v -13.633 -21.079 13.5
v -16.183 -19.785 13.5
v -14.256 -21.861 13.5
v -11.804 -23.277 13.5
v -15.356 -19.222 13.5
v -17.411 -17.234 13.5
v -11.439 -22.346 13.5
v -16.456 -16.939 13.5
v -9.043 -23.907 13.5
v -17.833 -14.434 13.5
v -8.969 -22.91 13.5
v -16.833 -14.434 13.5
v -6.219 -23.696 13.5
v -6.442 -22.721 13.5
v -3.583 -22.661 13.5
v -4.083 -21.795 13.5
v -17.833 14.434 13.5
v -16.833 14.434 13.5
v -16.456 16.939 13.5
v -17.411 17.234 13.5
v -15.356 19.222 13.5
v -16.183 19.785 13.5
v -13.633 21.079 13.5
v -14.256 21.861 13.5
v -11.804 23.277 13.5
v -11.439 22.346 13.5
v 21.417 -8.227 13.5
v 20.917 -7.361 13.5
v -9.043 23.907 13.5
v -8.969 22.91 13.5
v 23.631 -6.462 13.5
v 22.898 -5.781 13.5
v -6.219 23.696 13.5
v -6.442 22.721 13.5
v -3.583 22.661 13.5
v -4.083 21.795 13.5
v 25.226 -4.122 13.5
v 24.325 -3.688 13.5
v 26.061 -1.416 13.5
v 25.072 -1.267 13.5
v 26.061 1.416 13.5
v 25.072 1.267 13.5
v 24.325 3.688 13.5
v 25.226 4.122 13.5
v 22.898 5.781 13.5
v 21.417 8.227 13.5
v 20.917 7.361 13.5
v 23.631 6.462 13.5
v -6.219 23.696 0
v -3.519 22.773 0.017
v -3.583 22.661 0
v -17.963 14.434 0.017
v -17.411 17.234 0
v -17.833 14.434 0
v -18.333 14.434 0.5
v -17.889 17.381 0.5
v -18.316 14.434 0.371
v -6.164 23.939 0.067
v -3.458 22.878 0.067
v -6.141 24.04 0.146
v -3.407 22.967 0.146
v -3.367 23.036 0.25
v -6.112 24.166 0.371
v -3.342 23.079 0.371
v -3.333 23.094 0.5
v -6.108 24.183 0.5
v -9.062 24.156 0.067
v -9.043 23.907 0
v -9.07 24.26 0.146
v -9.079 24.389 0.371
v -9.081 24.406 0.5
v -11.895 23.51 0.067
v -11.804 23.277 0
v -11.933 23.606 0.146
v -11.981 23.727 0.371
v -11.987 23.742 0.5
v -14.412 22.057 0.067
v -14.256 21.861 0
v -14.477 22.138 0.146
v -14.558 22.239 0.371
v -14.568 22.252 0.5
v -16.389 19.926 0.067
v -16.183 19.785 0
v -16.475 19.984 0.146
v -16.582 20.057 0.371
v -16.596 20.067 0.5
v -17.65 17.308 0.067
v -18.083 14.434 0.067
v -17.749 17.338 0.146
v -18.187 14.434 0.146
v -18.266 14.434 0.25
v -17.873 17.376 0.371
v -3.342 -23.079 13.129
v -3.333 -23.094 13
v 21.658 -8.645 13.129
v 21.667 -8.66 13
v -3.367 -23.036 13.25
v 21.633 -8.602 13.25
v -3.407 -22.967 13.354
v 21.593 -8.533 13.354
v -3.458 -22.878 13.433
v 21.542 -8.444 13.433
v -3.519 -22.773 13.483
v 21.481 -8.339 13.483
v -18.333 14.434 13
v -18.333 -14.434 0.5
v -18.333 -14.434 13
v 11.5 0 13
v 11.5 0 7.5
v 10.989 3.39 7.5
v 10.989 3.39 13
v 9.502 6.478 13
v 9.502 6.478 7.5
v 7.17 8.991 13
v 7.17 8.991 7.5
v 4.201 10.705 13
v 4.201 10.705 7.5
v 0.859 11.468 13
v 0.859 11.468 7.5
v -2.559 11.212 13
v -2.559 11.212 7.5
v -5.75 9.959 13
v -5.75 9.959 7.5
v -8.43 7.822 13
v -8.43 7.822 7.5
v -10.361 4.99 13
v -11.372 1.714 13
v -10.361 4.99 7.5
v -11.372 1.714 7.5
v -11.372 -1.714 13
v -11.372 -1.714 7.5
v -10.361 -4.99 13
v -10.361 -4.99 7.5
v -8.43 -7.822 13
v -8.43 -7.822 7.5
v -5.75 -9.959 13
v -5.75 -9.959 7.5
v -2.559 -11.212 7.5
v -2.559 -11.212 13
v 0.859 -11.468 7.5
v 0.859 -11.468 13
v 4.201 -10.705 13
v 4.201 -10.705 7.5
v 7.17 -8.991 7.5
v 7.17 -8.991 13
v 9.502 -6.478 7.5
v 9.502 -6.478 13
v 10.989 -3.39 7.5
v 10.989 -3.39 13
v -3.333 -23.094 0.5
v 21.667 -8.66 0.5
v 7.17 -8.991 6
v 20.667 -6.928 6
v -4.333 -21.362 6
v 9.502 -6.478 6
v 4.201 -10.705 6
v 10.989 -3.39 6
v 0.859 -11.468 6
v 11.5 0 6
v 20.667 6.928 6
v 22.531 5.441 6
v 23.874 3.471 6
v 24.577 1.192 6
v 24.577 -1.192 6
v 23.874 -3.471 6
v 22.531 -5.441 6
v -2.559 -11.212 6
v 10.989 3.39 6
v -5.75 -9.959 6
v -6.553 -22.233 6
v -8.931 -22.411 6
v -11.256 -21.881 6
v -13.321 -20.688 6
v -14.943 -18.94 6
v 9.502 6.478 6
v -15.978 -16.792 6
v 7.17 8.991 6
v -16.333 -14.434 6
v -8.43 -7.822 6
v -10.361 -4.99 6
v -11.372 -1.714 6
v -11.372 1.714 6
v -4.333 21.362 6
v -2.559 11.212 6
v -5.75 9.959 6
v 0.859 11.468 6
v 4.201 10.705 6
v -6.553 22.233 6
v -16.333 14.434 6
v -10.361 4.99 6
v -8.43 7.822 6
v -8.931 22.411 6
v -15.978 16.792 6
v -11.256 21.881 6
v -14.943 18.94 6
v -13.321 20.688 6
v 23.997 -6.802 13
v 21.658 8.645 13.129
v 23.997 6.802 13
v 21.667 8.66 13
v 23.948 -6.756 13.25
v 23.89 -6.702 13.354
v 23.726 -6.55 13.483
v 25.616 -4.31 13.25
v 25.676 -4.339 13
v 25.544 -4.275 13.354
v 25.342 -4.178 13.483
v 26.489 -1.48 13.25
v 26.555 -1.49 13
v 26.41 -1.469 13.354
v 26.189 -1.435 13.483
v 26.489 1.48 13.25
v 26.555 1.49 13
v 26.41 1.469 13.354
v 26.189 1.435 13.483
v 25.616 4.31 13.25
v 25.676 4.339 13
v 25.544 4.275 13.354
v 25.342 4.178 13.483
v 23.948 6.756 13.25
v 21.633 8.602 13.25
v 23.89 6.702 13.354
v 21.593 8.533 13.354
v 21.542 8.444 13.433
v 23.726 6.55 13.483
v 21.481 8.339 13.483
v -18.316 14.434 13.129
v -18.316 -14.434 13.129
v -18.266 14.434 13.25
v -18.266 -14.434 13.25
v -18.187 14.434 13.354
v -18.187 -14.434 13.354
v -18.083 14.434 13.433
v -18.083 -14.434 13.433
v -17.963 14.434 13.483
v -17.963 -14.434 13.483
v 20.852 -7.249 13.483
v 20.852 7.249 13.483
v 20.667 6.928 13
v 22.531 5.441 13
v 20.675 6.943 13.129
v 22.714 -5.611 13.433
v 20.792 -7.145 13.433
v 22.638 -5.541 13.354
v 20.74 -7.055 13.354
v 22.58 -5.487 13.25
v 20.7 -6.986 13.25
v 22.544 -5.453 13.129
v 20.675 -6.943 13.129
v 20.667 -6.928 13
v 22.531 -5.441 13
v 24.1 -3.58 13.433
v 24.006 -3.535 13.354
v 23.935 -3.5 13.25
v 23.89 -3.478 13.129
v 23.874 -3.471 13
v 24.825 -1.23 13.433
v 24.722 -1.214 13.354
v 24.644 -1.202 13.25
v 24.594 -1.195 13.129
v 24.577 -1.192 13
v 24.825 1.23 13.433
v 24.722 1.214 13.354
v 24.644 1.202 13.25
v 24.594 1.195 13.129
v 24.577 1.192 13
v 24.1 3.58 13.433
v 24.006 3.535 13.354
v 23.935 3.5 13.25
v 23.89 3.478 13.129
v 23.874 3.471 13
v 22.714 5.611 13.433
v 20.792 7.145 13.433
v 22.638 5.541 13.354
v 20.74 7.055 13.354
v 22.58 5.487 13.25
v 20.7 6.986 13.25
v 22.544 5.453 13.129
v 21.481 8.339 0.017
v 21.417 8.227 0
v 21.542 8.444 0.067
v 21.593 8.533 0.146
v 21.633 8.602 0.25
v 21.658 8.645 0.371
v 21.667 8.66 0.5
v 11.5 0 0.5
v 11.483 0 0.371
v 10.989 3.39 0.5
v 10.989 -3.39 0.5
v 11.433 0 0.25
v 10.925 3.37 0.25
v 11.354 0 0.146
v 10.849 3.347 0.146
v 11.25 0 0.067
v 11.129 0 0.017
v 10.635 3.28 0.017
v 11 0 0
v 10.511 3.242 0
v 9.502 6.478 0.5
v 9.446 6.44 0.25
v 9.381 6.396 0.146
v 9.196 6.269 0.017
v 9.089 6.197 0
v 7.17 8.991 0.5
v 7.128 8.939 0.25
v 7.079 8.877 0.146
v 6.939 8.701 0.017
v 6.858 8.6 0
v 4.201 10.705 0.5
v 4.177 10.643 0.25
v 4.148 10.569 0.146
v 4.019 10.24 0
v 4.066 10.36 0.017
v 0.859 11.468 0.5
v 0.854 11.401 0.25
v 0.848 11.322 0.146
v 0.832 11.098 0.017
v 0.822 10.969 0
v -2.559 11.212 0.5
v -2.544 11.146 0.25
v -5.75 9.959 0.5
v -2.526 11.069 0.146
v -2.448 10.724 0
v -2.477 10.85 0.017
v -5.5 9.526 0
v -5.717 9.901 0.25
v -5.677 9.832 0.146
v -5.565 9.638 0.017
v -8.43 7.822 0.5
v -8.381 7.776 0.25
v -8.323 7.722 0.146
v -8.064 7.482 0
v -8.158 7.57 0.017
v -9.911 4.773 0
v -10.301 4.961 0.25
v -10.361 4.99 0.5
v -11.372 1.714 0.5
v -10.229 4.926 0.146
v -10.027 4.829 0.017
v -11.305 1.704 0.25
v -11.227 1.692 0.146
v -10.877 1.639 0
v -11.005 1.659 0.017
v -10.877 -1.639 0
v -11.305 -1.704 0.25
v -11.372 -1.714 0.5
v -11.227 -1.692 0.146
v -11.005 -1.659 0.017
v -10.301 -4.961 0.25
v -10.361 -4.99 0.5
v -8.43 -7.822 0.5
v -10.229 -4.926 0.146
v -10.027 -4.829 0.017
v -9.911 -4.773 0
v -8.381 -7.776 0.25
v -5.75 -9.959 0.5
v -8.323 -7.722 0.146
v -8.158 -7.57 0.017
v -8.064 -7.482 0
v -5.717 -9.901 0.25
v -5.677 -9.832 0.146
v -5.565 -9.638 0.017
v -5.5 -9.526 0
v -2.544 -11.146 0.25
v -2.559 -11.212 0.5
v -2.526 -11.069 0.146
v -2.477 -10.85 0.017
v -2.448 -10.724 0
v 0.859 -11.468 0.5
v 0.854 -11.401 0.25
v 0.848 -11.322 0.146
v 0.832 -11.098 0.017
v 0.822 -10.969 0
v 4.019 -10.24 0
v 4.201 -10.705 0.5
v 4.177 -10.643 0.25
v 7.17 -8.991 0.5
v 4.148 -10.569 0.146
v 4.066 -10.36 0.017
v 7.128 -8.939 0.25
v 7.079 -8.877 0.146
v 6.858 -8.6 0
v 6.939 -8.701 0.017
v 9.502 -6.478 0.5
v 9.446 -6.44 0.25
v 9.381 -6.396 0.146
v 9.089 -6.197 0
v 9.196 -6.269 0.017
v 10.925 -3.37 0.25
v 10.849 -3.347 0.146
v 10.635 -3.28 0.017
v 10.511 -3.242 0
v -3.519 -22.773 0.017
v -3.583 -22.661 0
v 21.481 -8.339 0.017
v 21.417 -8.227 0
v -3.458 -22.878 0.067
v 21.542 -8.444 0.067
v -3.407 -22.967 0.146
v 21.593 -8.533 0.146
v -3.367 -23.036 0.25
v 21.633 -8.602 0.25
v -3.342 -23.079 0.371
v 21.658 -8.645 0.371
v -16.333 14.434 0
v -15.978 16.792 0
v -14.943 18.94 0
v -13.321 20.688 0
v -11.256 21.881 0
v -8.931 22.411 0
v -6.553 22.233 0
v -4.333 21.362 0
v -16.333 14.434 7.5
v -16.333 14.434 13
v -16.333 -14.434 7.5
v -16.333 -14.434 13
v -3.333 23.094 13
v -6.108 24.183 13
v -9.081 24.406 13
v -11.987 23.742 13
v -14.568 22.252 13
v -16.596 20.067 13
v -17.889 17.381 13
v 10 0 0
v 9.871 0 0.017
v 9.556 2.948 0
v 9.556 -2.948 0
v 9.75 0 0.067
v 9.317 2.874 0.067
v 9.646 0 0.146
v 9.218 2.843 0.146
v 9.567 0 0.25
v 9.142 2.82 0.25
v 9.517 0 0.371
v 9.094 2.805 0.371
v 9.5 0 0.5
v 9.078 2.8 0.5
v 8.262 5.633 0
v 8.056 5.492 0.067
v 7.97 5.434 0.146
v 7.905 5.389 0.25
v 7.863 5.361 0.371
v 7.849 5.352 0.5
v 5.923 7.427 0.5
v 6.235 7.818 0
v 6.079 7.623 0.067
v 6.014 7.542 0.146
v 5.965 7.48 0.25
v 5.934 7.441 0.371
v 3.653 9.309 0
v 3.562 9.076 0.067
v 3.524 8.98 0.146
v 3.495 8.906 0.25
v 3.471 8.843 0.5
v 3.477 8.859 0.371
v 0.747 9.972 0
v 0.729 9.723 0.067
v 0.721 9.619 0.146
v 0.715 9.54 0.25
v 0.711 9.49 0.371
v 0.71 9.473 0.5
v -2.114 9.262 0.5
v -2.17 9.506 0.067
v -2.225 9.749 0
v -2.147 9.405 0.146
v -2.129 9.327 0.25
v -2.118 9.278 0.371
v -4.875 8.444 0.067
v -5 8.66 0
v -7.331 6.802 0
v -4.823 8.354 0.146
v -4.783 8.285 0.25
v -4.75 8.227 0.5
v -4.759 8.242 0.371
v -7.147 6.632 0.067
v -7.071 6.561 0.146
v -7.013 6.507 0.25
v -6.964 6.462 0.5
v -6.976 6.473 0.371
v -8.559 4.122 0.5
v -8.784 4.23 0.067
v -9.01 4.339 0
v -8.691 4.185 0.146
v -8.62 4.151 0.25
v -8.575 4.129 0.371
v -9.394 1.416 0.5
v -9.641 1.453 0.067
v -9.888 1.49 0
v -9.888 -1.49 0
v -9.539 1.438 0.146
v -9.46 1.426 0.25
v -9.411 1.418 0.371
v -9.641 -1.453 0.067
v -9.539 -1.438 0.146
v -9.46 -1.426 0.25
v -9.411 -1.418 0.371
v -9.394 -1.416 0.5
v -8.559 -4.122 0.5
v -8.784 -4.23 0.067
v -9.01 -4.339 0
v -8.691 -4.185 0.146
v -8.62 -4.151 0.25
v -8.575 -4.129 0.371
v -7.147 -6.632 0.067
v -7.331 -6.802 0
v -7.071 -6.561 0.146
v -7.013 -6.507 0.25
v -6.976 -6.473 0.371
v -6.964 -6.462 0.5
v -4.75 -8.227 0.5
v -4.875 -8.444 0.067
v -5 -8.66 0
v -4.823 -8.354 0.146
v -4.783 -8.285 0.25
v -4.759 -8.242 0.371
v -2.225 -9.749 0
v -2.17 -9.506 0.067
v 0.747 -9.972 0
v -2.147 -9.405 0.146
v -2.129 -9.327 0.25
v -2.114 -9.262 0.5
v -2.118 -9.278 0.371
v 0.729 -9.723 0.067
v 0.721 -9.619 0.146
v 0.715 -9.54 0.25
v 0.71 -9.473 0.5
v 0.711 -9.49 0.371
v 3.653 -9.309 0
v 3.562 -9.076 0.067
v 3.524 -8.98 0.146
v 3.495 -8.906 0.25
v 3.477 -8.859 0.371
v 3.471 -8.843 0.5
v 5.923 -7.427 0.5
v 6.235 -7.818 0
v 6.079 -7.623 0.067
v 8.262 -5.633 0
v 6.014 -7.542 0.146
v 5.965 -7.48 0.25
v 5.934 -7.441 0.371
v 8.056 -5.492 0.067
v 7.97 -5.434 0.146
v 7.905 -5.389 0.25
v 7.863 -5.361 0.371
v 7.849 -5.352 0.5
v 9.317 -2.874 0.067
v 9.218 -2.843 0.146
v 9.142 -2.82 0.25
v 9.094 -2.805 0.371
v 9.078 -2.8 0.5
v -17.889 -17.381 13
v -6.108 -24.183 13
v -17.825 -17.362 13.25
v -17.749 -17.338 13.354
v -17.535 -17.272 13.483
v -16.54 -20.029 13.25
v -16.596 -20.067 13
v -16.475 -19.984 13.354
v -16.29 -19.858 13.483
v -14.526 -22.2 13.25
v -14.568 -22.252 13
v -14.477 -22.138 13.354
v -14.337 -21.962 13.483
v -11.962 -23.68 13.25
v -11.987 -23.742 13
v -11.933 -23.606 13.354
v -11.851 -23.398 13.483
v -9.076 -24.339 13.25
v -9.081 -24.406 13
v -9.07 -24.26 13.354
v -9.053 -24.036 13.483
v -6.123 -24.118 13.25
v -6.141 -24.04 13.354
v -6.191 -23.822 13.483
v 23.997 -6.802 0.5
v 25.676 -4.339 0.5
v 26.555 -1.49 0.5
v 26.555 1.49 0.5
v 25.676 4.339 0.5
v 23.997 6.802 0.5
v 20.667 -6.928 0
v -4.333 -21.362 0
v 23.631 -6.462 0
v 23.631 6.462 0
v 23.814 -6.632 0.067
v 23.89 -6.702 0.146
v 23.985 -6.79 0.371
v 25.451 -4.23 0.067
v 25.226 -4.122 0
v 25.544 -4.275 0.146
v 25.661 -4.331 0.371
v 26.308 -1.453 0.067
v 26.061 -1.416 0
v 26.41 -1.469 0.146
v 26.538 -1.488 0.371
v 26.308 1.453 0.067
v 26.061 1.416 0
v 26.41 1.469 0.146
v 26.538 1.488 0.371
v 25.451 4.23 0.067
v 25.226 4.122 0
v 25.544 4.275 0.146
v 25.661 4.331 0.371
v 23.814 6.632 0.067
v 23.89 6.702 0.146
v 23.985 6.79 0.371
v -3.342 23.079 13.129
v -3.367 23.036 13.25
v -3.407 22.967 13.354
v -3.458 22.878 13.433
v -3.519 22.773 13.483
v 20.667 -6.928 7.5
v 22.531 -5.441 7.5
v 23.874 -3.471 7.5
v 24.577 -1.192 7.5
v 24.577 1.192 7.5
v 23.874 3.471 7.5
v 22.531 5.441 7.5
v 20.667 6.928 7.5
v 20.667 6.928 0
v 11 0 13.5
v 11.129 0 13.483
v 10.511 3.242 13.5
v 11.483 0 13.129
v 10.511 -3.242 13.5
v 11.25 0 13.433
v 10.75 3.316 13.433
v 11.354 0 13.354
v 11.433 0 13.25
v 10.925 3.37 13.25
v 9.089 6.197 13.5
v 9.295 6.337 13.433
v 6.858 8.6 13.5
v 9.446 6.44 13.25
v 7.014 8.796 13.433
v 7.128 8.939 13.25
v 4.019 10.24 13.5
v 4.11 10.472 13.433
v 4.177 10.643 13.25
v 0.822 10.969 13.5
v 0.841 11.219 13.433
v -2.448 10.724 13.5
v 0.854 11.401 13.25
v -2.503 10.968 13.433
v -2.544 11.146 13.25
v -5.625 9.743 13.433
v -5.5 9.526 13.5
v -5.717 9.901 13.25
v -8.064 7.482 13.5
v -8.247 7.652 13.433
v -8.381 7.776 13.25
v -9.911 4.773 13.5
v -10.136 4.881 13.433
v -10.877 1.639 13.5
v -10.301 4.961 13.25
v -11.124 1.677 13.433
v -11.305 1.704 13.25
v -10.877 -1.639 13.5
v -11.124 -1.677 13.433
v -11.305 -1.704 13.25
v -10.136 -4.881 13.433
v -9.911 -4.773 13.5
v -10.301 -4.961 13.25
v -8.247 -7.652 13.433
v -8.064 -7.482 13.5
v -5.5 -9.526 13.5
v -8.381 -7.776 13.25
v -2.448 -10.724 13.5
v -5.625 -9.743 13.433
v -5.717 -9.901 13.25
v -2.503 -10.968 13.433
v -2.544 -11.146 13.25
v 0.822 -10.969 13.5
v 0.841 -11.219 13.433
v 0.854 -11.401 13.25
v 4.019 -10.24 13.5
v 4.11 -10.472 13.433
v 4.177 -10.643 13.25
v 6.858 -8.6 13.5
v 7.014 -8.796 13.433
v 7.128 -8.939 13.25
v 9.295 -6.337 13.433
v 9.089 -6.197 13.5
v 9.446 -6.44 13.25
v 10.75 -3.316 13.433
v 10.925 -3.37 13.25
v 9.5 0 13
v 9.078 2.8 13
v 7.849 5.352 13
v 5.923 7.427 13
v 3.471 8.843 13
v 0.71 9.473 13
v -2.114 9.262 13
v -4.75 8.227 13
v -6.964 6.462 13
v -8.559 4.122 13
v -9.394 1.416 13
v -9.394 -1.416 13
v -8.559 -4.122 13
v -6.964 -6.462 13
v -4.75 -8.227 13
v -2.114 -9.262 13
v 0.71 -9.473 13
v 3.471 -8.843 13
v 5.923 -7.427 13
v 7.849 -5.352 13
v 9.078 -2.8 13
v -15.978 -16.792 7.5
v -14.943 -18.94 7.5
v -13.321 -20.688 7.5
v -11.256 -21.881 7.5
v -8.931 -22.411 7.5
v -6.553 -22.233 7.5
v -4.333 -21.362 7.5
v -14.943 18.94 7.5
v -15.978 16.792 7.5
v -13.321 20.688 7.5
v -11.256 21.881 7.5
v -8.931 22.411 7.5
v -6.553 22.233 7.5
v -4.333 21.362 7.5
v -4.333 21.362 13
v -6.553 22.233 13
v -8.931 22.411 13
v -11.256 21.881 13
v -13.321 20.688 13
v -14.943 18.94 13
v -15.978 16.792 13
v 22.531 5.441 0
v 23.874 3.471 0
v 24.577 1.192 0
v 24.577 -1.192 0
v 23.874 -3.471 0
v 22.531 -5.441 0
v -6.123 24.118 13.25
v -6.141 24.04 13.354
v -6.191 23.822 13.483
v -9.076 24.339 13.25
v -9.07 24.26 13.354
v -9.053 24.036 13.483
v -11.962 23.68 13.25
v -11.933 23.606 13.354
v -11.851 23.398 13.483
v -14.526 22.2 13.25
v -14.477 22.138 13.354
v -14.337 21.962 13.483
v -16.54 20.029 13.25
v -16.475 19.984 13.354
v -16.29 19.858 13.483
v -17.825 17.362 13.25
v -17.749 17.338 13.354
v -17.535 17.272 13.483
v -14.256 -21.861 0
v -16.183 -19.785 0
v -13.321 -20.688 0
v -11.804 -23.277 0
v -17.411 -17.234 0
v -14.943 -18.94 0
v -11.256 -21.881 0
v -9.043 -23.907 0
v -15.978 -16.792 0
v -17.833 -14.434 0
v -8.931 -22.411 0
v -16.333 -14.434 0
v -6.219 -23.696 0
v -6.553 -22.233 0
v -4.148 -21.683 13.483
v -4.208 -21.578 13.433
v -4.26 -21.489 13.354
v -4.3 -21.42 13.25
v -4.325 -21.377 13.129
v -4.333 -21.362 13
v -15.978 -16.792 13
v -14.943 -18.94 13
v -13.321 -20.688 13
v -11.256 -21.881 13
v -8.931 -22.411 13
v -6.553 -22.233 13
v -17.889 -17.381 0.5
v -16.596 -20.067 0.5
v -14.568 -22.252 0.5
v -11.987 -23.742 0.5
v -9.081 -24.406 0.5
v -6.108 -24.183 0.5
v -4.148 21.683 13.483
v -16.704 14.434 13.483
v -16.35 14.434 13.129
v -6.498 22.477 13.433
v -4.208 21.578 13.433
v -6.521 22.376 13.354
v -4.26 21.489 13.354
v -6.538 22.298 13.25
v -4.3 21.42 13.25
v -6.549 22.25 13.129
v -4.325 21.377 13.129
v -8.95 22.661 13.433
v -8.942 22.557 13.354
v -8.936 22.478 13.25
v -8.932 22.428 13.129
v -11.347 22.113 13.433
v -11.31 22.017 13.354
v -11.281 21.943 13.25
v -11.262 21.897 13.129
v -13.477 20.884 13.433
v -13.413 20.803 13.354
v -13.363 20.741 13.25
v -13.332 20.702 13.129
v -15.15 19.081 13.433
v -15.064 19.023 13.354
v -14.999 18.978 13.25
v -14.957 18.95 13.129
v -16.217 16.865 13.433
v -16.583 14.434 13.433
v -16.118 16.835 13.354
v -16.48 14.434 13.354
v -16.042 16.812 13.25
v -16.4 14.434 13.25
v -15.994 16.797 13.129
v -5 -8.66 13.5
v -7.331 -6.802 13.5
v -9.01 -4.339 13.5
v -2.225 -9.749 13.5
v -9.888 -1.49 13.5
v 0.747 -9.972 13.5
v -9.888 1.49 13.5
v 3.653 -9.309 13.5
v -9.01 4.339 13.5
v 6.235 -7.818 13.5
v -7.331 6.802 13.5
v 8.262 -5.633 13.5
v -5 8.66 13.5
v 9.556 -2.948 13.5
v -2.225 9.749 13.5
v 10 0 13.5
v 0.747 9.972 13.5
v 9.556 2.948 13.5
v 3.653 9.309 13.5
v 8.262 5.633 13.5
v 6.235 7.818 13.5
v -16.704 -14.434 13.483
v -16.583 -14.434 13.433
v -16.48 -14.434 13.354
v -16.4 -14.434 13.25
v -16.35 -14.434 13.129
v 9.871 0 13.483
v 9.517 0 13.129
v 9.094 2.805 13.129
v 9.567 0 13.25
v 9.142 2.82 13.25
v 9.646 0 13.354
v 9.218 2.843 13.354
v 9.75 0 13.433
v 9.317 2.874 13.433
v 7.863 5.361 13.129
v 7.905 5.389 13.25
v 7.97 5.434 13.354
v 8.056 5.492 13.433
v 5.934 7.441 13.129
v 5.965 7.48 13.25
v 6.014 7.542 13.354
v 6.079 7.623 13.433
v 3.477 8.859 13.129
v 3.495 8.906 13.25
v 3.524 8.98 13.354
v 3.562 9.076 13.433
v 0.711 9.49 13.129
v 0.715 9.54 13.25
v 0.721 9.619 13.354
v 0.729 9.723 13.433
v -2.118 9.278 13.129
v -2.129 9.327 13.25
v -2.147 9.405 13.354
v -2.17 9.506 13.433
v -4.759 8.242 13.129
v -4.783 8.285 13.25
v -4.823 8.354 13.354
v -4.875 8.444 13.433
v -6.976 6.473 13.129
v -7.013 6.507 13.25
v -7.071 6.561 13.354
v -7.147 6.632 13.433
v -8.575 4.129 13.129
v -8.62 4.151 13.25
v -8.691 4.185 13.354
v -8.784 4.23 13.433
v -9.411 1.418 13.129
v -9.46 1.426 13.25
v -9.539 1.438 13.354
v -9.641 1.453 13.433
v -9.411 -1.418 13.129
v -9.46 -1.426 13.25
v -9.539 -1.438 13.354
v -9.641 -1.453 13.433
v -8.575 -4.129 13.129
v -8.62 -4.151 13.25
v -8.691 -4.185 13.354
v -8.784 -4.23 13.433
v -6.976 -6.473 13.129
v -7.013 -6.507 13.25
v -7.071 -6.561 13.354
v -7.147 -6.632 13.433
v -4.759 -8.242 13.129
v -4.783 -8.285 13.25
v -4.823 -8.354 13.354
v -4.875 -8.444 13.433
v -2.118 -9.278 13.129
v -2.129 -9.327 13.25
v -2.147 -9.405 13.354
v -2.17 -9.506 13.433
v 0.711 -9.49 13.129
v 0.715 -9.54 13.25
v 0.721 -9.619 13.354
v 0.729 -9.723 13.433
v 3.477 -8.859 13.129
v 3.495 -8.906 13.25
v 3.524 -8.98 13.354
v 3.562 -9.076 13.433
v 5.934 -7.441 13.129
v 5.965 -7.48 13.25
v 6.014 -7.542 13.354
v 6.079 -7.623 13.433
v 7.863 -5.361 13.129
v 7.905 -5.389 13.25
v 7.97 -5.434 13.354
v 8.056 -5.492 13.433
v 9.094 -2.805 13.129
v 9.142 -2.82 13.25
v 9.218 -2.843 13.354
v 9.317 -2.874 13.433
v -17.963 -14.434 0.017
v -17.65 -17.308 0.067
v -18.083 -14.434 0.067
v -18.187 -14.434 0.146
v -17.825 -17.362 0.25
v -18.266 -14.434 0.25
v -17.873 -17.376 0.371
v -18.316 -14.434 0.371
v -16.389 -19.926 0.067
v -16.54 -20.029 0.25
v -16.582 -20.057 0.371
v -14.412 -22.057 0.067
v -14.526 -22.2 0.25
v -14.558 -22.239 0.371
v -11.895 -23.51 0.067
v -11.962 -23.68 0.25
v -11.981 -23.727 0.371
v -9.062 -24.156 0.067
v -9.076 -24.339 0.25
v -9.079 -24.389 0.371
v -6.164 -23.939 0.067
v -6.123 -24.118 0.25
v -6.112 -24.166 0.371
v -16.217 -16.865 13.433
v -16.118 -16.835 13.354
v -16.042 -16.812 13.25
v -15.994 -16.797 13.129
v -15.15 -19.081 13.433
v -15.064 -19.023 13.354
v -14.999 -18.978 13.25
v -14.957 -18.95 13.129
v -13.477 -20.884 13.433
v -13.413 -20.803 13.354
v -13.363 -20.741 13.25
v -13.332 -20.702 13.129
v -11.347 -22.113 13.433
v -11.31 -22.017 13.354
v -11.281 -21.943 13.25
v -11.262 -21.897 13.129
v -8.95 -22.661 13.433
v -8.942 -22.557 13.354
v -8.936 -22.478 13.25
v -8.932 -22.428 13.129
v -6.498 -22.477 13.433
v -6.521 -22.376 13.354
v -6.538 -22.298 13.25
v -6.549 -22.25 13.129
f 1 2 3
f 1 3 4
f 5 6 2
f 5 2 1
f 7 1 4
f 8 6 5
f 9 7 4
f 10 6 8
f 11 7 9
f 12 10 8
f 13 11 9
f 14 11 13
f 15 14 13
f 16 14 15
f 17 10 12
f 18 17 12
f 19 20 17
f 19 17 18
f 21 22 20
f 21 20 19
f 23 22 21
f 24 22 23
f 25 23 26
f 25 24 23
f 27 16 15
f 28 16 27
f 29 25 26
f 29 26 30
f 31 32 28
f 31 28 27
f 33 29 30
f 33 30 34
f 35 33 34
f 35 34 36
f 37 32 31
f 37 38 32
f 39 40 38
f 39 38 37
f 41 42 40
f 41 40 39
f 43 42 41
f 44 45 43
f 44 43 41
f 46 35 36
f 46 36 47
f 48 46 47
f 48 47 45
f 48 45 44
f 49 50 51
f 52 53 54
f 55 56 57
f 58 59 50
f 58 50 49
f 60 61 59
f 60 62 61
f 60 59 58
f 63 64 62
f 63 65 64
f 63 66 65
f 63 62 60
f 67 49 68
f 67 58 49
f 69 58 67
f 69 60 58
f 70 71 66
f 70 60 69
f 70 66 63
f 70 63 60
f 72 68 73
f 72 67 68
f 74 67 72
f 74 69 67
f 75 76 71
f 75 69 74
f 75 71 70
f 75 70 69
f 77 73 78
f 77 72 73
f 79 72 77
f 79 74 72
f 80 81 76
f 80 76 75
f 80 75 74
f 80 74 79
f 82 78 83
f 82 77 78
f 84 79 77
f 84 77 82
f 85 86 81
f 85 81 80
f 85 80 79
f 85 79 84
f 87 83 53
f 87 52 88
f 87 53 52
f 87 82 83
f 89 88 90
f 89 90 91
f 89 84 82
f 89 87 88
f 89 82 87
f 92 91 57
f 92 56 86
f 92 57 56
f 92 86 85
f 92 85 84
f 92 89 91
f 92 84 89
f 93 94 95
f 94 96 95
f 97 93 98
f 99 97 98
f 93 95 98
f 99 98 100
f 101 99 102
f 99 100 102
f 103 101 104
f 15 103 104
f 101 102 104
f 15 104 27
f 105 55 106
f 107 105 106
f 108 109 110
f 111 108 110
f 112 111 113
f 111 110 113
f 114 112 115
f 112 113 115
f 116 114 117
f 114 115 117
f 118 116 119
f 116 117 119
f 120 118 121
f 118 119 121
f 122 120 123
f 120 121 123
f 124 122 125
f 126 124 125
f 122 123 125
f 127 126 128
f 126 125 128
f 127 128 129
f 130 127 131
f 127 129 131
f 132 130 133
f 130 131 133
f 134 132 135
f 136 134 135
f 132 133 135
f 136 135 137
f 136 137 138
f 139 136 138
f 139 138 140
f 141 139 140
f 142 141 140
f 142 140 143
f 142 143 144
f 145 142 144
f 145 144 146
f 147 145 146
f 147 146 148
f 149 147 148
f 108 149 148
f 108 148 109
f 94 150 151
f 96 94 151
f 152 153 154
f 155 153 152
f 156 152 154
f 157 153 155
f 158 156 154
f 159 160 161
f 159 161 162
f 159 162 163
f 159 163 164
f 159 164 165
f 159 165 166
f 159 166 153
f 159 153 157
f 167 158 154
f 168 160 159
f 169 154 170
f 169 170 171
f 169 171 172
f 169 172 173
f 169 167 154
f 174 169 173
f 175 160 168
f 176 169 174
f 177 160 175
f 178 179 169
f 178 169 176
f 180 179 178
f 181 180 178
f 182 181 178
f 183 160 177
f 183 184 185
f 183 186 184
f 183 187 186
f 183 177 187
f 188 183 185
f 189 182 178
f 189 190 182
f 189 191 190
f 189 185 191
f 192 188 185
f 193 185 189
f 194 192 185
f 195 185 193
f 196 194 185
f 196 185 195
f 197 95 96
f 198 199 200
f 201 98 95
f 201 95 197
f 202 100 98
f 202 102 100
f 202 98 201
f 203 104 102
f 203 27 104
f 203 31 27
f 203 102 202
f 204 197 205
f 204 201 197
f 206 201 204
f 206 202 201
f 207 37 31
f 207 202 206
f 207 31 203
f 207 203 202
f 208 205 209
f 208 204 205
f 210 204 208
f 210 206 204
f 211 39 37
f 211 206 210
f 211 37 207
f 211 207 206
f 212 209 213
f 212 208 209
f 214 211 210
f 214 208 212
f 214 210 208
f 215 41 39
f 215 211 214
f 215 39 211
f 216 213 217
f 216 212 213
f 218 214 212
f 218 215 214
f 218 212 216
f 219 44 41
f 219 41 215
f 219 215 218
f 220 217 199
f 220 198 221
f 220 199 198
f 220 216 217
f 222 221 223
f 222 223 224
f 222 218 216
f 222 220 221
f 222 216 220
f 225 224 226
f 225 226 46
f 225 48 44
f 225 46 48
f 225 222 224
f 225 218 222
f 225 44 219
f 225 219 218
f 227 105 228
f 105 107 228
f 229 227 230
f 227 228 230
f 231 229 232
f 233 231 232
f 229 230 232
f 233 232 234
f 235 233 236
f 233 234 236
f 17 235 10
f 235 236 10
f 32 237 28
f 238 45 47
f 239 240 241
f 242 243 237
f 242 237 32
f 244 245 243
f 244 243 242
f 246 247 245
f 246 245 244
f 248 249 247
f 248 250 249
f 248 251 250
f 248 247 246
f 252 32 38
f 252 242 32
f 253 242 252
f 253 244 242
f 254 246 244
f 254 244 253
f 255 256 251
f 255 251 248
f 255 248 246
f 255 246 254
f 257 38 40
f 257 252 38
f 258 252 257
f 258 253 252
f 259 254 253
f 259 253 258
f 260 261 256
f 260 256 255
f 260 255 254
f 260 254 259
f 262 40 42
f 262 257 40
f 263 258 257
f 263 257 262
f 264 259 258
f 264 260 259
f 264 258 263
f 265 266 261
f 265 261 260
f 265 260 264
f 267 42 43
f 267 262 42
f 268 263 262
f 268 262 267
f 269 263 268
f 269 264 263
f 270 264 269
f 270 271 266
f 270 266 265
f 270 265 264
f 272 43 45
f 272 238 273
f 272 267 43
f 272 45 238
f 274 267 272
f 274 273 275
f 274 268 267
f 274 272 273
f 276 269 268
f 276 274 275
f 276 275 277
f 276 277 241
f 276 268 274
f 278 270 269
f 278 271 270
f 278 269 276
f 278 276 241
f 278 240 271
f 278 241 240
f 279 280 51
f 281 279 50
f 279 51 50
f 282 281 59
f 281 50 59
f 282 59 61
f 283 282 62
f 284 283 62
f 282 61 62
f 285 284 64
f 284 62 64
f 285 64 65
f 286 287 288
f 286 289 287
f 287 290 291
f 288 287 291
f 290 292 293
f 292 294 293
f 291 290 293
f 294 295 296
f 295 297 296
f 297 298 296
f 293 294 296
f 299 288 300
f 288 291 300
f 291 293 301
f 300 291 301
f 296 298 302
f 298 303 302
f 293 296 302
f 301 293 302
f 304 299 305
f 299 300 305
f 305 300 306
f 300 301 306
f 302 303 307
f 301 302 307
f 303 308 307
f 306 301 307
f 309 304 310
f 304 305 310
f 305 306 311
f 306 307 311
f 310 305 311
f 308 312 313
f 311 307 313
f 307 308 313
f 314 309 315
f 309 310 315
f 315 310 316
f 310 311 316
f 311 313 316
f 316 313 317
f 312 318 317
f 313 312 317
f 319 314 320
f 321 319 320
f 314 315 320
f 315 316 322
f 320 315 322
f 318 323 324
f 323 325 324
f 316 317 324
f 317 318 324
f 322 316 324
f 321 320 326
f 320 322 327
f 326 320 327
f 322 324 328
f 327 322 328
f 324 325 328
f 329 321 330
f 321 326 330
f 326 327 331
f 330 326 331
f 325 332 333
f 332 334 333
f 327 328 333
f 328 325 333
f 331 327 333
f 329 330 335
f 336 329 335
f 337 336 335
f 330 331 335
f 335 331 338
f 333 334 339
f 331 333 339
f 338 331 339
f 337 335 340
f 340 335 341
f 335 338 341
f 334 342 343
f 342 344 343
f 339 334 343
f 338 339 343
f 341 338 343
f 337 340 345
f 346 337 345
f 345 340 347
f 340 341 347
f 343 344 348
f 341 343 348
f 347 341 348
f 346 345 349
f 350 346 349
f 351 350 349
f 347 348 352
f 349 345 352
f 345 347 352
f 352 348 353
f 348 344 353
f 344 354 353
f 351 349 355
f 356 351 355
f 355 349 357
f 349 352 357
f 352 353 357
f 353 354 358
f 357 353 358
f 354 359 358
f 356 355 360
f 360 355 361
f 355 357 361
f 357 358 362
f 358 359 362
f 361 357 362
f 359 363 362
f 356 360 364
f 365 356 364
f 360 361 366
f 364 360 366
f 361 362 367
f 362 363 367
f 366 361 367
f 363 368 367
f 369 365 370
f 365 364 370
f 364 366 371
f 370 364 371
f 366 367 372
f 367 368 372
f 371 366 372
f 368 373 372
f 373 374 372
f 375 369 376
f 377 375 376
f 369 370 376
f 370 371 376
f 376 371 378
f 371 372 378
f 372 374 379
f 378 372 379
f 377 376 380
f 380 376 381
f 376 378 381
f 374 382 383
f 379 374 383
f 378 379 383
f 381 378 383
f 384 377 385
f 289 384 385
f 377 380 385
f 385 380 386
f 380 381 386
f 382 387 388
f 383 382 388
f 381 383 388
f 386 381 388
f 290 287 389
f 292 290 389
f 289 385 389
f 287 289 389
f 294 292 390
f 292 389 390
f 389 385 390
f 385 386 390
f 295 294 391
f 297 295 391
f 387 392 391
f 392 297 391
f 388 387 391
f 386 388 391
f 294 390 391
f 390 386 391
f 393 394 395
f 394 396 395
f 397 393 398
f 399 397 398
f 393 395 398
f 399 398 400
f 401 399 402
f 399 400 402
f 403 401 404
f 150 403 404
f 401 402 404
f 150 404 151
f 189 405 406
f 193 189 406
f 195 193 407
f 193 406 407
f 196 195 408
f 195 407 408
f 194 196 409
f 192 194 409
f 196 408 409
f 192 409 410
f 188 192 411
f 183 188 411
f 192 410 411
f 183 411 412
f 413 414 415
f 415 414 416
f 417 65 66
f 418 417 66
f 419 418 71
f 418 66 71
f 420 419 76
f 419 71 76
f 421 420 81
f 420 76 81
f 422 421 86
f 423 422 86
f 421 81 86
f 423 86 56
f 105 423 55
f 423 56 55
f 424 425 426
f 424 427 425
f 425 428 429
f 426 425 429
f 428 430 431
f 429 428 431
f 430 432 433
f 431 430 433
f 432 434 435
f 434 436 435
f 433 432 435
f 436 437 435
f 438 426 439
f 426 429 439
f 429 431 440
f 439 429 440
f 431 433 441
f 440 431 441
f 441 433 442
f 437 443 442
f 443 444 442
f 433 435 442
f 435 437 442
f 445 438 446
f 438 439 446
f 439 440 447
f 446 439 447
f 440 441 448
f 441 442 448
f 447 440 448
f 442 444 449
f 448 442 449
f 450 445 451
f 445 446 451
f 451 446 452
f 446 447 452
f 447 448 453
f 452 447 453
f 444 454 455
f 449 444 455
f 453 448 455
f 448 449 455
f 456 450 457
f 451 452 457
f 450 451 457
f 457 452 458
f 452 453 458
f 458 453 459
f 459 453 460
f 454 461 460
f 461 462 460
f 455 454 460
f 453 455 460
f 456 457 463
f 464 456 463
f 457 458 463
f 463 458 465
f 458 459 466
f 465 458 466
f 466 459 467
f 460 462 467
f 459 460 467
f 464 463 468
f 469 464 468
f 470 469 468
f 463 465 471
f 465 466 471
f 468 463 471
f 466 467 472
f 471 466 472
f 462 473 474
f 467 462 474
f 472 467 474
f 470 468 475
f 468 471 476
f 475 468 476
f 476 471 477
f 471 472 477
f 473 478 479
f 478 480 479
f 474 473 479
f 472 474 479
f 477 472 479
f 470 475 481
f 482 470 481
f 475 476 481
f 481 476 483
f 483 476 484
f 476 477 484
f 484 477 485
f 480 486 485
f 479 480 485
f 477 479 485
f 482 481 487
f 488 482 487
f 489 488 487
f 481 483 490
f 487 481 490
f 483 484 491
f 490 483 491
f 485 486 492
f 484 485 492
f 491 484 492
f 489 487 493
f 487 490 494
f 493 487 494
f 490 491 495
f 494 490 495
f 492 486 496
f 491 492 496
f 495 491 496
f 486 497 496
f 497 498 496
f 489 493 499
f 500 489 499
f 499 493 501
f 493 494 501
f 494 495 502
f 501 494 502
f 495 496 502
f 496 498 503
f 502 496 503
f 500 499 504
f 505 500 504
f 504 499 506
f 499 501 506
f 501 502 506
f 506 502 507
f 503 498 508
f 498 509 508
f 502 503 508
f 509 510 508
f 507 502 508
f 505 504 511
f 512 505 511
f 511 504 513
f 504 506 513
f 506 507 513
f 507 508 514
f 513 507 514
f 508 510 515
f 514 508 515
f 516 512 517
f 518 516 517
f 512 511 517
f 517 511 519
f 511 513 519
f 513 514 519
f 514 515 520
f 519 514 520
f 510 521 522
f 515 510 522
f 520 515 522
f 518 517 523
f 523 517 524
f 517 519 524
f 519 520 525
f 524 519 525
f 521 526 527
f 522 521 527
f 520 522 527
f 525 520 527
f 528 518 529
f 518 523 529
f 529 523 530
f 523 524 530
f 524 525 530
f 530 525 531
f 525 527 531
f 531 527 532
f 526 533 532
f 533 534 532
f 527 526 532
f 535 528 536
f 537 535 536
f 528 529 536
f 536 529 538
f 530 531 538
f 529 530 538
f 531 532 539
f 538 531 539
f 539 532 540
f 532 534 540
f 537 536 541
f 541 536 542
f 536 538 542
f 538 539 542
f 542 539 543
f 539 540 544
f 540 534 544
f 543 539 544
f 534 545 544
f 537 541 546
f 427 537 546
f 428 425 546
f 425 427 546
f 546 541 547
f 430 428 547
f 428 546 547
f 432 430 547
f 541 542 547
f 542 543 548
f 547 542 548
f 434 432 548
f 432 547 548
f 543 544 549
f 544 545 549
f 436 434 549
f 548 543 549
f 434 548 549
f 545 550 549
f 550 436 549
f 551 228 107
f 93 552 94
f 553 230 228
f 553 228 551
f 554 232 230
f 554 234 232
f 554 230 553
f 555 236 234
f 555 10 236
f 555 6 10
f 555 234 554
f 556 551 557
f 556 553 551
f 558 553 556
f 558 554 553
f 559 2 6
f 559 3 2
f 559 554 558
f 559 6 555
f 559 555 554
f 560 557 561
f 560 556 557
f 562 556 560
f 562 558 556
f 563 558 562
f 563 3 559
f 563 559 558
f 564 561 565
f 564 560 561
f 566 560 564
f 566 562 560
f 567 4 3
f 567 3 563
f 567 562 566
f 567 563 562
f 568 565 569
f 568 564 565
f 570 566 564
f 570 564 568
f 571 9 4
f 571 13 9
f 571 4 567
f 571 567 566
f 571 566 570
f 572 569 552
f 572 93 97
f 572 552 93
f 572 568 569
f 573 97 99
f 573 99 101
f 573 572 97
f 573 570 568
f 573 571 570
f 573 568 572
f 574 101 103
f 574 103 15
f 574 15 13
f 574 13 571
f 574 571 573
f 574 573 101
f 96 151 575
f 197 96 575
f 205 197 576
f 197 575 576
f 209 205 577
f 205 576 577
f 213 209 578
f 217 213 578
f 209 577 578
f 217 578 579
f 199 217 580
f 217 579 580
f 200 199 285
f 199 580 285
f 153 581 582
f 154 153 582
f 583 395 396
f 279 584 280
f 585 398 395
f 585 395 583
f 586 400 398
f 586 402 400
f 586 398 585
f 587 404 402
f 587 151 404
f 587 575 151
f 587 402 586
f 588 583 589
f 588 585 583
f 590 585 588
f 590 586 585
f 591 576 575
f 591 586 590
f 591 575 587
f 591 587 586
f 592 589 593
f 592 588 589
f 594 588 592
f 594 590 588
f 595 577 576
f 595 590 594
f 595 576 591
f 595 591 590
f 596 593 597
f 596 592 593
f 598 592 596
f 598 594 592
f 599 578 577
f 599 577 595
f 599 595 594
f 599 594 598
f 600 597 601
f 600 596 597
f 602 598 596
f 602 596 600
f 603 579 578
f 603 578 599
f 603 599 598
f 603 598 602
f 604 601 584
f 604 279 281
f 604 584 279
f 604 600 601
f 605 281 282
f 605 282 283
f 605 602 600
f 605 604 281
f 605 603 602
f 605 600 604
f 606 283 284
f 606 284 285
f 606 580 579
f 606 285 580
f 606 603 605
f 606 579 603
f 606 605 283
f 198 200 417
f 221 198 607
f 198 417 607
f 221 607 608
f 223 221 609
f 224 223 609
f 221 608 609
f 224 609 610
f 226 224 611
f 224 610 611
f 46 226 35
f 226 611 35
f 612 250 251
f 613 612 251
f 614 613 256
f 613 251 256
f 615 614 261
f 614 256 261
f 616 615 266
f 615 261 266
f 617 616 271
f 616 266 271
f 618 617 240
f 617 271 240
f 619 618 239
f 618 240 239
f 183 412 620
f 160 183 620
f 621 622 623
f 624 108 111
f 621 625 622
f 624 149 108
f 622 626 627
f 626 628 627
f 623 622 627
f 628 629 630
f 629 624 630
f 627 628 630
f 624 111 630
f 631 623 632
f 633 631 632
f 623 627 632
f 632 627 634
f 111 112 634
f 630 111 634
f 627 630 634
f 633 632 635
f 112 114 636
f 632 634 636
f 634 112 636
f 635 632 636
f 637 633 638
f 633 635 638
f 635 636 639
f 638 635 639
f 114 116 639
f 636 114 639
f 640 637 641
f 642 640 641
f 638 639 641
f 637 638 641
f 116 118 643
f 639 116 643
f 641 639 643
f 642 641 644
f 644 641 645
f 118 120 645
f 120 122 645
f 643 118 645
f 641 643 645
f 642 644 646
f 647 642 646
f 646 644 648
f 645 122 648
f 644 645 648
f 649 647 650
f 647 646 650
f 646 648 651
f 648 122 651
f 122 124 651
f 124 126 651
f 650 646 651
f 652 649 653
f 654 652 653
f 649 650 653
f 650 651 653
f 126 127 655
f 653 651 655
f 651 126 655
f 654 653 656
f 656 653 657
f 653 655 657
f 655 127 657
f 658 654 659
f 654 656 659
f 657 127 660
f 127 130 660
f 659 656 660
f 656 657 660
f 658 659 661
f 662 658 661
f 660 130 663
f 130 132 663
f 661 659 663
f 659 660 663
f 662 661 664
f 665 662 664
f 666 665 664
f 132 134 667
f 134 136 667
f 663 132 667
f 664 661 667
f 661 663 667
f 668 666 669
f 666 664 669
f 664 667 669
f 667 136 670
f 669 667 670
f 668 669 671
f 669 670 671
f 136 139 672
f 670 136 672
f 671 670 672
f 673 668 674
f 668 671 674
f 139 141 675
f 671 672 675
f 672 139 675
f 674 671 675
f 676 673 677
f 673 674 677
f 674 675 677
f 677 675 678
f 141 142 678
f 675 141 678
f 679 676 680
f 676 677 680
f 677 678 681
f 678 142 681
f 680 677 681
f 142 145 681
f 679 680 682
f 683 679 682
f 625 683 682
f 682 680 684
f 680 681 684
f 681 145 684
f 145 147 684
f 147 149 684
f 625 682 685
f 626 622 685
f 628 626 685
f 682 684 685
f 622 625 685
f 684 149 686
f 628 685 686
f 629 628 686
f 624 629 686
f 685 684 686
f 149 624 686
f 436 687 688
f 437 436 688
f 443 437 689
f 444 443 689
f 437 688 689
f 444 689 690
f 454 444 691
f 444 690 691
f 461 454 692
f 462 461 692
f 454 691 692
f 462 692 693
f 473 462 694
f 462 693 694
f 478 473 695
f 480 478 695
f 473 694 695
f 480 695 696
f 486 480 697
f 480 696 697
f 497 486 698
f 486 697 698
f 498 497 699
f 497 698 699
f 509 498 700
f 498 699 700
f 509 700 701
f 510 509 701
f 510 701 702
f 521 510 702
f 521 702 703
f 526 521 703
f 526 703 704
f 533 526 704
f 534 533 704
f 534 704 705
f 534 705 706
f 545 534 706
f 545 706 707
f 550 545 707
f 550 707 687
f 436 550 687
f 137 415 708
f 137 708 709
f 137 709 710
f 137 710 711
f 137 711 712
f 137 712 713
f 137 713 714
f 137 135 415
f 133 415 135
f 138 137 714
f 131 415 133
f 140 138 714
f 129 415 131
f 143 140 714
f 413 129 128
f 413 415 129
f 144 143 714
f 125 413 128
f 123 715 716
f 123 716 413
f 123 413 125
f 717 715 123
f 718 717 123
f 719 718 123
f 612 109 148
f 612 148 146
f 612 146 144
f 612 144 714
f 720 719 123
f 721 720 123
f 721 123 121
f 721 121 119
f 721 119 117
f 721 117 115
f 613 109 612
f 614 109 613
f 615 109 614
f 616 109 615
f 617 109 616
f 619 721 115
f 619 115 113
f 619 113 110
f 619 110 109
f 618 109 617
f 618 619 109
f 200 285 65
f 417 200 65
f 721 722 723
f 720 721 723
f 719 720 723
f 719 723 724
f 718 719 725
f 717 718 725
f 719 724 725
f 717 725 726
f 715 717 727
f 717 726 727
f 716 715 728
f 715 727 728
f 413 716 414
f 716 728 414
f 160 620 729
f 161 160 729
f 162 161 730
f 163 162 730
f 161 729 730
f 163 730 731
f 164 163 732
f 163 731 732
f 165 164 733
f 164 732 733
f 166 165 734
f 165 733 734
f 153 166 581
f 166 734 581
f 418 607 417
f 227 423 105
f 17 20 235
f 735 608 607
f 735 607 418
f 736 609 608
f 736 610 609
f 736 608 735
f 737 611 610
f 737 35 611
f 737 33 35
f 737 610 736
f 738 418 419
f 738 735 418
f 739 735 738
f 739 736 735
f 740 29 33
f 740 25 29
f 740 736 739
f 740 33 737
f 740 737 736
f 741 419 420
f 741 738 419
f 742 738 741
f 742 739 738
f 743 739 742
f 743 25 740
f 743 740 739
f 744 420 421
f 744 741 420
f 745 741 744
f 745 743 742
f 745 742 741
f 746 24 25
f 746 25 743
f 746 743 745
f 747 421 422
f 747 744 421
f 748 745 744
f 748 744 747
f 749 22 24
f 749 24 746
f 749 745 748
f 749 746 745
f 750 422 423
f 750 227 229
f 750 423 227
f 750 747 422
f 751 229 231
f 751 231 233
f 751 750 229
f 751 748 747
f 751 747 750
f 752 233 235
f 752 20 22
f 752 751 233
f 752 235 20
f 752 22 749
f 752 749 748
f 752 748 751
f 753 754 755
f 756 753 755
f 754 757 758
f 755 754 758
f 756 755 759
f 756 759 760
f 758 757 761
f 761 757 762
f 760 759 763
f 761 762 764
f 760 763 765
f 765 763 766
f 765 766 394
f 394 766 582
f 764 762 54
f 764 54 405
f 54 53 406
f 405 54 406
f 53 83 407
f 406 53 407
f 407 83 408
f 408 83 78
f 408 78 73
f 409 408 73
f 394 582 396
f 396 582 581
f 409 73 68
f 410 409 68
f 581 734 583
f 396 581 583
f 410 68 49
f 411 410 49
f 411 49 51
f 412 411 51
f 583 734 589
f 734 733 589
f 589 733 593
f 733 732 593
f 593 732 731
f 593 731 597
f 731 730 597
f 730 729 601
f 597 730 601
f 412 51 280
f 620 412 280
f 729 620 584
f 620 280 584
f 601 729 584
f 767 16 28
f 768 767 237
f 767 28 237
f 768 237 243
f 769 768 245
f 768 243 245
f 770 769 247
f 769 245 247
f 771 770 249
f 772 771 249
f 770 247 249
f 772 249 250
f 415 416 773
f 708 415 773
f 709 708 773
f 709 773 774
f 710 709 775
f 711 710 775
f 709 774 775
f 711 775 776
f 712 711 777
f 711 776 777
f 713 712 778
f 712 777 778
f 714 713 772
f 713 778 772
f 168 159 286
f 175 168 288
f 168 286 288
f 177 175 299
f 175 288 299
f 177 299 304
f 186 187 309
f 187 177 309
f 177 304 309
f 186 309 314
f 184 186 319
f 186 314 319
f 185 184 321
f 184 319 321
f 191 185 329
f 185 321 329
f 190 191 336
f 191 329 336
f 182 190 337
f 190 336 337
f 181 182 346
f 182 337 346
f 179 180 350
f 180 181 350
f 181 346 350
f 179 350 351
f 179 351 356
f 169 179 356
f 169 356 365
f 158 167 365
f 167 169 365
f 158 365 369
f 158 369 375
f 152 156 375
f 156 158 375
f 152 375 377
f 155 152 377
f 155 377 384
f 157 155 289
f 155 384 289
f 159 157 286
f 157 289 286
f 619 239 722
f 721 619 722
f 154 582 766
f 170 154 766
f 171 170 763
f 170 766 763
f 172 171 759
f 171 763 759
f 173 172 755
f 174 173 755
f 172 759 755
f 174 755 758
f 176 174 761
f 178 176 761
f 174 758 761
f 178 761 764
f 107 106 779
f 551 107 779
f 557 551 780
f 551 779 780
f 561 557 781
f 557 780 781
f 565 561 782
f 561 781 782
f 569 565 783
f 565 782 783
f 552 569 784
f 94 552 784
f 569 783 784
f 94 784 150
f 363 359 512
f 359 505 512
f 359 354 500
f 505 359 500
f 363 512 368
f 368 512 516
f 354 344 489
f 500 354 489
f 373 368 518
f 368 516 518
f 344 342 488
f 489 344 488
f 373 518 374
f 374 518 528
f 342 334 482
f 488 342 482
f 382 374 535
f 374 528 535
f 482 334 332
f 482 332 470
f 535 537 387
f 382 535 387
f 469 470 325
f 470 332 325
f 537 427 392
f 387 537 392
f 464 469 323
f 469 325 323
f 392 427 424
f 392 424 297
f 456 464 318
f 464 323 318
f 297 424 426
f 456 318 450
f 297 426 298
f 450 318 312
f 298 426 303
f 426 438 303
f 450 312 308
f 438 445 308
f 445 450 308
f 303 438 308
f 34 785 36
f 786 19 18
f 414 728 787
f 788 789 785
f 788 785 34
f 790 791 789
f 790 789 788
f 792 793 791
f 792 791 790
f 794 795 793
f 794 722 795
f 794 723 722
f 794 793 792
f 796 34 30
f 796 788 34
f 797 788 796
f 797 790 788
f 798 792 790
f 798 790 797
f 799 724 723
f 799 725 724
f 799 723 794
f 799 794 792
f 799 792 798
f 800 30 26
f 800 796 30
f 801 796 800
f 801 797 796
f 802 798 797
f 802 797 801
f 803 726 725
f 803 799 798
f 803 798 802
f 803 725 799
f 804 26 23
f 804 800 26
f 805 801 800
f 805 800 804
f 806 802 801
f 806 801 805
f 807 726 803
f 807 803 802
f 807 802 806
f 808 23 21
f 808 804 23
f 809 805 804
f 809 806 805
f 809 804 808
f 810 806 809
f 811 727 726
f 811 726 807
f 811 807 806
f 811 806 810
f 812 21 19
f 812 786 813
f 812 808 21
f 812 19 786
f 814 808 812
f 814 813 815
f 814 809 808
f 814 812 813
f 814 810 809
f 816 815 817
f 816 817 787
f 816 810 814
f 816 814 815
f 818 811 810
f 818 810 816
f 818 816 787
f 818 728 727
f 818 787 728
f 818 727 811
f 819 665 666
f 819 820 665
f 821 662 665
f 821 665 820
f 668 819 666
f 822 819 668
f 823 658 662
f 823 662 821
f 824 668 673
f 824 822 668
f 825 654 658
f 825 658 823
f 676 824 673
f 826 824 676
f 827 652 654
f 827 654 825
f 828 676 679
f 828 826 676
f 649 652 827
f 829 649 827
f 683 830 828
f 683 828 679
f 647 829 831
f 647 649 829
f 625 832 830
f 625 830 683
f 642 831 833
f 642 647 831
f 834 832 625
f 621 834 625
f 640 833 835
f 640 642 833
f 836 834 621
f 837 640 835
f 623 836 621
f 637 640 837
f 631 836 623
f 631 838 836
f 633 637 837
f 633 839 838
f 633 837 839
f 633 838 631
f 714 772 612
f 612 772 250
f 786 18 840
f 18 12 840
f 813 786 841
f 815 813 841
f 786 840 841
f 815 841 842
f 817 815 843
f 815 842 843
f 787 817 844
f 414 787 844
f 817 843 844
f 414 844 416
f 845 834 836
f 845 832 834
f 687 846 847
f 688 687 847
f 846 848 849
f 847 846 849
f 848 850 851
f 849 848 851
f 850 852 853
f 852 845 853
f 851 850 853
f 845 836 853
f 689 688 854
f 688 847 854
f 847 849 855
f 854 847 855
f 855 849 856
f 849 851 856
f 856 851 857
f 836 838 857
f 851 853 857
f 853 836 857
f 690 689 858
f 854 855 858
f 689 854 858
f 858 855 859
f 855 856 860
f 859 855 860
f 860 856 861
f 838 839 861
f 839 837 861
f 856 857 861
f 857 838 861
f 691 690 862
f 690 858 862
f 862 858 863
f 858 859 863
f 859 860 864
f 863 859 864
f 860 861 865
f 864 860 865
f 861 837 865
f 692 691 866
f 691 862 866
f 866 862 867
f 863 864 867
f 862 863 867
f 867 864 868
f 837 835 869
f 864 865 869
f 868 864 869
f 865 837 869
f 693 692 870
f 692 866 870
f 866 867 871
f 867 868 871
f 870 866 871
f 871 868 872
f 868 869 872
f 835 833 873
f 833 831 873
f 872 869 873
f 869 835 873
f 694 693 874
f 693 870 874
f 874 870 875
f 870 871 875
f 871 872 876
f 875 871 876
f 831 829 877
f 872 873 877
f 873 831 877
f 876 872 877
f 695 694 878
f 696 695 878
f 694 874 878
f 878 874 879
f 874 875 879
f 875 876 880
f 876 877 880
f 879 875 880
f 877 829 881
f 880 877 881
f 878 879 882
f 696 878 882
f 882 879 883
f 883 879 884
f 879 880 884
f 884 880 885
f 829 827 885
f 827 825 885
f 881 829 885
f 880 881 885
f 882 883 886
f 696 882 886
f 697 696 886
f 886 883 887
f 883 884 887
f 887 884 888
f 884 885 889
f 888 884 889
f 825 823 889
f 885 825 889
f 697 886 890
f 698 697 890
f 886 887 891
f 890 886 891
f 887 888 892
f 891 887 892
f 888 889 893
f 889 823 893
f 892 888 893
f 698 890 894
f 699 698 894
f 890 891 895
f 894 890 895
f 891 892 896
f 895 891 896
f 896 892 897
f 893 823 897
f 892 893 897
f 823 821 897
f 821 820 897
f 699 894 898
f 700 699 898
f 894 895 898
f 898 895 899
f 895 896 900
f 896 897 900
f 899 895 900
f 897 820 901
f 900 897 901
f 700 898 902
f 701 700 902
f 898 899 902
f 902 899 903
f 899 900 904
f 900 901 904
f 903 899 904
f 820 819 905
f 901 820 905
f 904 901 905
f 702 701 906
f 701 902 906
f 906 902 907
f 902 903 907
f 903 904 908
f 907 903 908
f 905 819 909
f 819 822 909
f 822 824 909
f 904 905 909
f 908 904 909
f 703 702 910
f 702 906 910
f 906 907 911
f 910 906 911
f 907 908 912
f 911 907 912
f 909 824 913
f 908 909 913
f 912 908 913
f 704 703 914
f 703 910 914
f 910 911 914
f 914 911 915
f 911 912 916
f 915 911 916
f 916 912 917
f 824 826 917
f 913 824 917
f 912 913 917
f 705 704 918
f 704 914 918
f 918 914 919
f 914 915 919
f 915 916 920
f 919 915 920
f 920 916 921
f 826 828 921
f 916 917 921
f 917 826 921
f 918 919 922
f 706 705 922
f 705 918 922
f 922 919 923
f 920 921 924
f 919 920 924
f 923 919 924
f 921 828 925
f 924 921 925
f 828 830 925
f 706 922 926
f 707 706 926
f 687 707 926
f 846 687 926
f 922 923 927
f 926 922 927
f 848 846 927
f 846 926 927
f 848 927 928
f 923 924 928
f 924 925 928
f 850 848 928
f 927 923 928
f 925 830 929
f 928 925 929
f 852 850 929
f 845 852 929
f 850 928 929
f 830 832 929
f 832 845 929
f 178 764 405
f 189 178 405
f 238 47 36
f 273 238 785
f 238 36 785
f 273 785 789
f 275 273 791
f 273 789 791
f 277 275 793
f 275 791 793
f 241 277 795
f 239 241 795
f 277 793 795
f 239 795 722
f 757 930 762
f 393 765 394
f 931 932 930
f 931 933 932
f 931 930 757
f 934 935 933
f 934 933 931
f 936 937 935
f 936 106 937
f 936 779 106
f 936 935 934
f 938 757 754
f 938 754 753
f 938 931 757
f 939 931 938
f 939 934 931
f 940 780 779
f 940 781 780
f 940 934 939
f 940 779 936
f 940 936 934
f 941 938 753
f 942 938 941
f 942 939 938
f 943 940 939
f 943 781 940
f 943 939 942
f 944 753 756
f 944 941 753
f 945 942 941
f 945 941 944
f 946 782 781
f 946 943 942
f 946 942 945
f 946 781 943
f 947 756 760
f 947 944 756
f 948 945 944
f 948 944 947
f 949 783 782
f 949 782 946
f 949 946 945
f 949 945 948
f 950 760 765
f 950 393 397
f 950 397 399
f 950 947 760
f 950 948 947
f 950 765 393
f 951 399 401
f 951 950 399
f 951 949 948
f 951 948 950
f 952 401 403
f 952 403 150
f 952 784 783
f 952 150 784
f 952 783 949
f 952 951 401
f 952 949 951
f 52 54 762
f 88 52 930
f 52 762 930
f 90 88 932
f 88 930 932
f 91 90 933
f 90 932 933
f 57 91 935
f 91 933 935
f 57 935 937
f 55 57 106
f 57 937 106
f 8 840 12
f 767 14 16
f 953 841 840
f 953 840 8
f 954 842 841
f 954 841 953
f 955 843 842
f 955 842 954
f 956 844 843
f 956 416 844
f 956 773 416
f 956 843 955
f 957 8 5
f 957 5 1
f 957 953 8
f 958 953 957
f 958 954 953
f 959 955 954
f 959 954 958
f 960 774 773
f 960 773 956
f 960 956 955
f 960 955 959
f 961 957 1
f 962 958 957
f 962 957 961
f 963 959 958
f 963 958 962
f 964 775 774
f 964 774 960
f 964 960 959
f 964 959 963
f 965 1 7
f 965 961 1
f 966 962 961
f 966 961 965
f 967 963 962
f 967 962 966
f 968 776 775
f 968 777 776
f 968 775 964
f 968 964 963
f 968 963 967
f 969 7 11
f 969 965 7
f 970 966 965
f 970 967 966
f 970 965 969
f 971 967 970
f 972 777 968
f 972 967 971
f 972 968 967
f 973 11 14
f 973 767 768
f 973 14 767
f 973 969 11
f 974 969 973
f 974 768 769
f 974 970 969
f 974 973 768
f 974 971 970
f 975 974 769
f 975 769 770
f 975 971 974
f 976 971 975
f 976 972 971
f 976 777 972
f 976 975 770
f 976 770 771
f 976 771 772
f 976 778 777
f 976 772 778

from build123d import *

# Parameters (mm, degrees)
EXTRUDE_1_DEPTH     = 13.5
CUT_EXTRUDE_1_DEPTH = 6
CUT_EXTRUDE_2_DEPTH = 6
EXTRUDE_START       = -7.5
SKETCH_4_R          = 11.5
EXTRUDE_2_DEPTH     = 13.5
CUT_EXTRUDE_3_REACH = 15.5
SKETCH_5_R          = 9.5
FILLET_1_R          = 0.5


with BuildPart() as part:
    # 草圖1 → 填料-伸長1 (new body)
    with BuildSketch(Plane.XY):
        with BuildLine():
            Line((21.666666667, 8.660254038), (-3.333333333, 23.094010768))
            ThreePointArc((-3.333333333, 23.094010768), (-13.333333333, 23.094010768), (-18.333333333, 14.43375673))
            Line((-18.333333333, 14.43375673), (-18.333333333, -14.43375673))
            ThreePointArc((-18.333333333, -14.43375673), (-13.333333333, -23.094010768), (-3.333333333, -23.094010768))
            Line((-3.333333333, -23.094010768), (21.666666667, -8.660254038))
            ThreePointArc((21.666666667, -8.660254038), (26.666666667, 0), (21.666666667, 8.660254038))
        make_face()
    extrude(amount=EXTRUDE_1_DEPTH)

    # 草圖2 → 除料-伸長1 (cut)
    with BuildSketch(Plane.XY.offset(13.5)):
        with BuildLine():
            Line((20.666666667, 6.92820323), (-4.333333333, 21.36195996))
            ThreePointArc((-4.333333333, 21.36195996), (-12.333333333, 21.36195996), (-16.333333333, 14.43375673))
            Line((-16.333333333, 14.43375673), (-16.333333333, -14.43375673))
            ThreePointArc((-16.333333333, -14.43375673), (-12.333333333, -21.36195996), (-4.333333333, -21.36195996))
            Line((-4.333333333, -21.36195996), (20.666666667, -6.92820323))
            ThreePointArc((20.666666667, -6.92820323), (24.666666667, 0), (20.666666667, 6.92820323))
        make_face()
    extrude(amount=-CUT_EXTRUDE_1_DEPTH, mode=Mode.SUBTRACT)

    # 草圖3 → 除料-伸長2 (cut)
    with BuildSketch(Plane(origin=(0, 0, 0), x_dir=(-1, 0, 0), z_dir=(0, 0, -1))):
        with BuildLine():
            Line((-20.666666667, -6.92820323), (4.333333333, -21.36195996))
            ThreePointArc((4.333333333, -21.36195996), (12.333333333, -21.36195996), (16.333333333, -14.43375673))
            Line((16.333333333, -14.43375673), (16.333333333, 14.43375673))
            ThreePointArc((16.333333333, 14.43375673), (12.333333333, 21.36195996), (4.333333333, 21.36195996))
            Line((4.333333333, 21.36195996), (-20.666666667, 6.92820323))
            ThreePointArc((-20.666666667, 6.92820323), (-24.666666667, 0), (-20.666666667, -6.92820323))
        make_face()
    extrude(amount=-CUT_EXTRUDE_2_DEPTH, mode=Mode.SUBTRACT)

    # 草圖4 → 填料-伸長2 (add)
    with BuildSketch(Plane.XY.offset(7.5).offset(EXTRUDE_START)):
        Circle(SKETCH_4_R)
    extrude(amount=EXTRUDE_2_DEPTH)

    # 草圖5 → 除料-伸長3 (cut, up to next)
    with BuildSketch(Plane.XY.offset(13.5), mode=Mode.PRIVATE) as cut_extrude_3_sk1:
        Circle(SKETCH_5_R)
    cut_extrude_3_tool1 = extrude(cut_extrude_3_sk1.sketch, amount=-CUT_EXTRUDE_3_REACH, mode=Mode.PRIVATE) & part.part
    add(cut_extrude_3_tool1.solids().sort_by_distance((0, 0, 13.5))[0], mode=Mode.SUBTRACT)

    # 圓角1
    fillet_1_edges = [part.edges().sort_by_distance(p)[0] for p in [
        (-13.333333333, 23.094010768, 13.5),
        (-18.333333333, 0, 13.5),
        (-13.333333333, -23.094010768, 13.5),
        (24.666666667, 0, 13.5),
        (9.166666667, -15.877132403, 13.5),
        (8.166666667, 14.145081595, 13.5),
        (-12.333333333, 21.36195996, 13.5),
        (-16.333333333, 0, 13.5),
        (-12.333333333, -21.36195996, 13.5),
        (8.166666667, -14.145081595, 13.5),
        (26.666666667, 0, 13.5),
        (-11.5, 0, 13.5),
        (-11.5, 0, 0),
        (-9.5, 0, 0),
        (-9.5, 0, 13.5),
        (9.166666667, -15.877132403, 0),
        (-13.333333333, -23.094010768, 0),
        (-18.333333333, 0, 0),
        (-13.333333333, 23.094010768, 0),
        (9.166666667, 15.877132403, 0),
        (26.666666667, 0, 0),
        (9.166666667, 15.877132403, 13.5),
    ]]
    fillet(fillet_1_edges, radius=FILLET_1_R)


solid = part.part
